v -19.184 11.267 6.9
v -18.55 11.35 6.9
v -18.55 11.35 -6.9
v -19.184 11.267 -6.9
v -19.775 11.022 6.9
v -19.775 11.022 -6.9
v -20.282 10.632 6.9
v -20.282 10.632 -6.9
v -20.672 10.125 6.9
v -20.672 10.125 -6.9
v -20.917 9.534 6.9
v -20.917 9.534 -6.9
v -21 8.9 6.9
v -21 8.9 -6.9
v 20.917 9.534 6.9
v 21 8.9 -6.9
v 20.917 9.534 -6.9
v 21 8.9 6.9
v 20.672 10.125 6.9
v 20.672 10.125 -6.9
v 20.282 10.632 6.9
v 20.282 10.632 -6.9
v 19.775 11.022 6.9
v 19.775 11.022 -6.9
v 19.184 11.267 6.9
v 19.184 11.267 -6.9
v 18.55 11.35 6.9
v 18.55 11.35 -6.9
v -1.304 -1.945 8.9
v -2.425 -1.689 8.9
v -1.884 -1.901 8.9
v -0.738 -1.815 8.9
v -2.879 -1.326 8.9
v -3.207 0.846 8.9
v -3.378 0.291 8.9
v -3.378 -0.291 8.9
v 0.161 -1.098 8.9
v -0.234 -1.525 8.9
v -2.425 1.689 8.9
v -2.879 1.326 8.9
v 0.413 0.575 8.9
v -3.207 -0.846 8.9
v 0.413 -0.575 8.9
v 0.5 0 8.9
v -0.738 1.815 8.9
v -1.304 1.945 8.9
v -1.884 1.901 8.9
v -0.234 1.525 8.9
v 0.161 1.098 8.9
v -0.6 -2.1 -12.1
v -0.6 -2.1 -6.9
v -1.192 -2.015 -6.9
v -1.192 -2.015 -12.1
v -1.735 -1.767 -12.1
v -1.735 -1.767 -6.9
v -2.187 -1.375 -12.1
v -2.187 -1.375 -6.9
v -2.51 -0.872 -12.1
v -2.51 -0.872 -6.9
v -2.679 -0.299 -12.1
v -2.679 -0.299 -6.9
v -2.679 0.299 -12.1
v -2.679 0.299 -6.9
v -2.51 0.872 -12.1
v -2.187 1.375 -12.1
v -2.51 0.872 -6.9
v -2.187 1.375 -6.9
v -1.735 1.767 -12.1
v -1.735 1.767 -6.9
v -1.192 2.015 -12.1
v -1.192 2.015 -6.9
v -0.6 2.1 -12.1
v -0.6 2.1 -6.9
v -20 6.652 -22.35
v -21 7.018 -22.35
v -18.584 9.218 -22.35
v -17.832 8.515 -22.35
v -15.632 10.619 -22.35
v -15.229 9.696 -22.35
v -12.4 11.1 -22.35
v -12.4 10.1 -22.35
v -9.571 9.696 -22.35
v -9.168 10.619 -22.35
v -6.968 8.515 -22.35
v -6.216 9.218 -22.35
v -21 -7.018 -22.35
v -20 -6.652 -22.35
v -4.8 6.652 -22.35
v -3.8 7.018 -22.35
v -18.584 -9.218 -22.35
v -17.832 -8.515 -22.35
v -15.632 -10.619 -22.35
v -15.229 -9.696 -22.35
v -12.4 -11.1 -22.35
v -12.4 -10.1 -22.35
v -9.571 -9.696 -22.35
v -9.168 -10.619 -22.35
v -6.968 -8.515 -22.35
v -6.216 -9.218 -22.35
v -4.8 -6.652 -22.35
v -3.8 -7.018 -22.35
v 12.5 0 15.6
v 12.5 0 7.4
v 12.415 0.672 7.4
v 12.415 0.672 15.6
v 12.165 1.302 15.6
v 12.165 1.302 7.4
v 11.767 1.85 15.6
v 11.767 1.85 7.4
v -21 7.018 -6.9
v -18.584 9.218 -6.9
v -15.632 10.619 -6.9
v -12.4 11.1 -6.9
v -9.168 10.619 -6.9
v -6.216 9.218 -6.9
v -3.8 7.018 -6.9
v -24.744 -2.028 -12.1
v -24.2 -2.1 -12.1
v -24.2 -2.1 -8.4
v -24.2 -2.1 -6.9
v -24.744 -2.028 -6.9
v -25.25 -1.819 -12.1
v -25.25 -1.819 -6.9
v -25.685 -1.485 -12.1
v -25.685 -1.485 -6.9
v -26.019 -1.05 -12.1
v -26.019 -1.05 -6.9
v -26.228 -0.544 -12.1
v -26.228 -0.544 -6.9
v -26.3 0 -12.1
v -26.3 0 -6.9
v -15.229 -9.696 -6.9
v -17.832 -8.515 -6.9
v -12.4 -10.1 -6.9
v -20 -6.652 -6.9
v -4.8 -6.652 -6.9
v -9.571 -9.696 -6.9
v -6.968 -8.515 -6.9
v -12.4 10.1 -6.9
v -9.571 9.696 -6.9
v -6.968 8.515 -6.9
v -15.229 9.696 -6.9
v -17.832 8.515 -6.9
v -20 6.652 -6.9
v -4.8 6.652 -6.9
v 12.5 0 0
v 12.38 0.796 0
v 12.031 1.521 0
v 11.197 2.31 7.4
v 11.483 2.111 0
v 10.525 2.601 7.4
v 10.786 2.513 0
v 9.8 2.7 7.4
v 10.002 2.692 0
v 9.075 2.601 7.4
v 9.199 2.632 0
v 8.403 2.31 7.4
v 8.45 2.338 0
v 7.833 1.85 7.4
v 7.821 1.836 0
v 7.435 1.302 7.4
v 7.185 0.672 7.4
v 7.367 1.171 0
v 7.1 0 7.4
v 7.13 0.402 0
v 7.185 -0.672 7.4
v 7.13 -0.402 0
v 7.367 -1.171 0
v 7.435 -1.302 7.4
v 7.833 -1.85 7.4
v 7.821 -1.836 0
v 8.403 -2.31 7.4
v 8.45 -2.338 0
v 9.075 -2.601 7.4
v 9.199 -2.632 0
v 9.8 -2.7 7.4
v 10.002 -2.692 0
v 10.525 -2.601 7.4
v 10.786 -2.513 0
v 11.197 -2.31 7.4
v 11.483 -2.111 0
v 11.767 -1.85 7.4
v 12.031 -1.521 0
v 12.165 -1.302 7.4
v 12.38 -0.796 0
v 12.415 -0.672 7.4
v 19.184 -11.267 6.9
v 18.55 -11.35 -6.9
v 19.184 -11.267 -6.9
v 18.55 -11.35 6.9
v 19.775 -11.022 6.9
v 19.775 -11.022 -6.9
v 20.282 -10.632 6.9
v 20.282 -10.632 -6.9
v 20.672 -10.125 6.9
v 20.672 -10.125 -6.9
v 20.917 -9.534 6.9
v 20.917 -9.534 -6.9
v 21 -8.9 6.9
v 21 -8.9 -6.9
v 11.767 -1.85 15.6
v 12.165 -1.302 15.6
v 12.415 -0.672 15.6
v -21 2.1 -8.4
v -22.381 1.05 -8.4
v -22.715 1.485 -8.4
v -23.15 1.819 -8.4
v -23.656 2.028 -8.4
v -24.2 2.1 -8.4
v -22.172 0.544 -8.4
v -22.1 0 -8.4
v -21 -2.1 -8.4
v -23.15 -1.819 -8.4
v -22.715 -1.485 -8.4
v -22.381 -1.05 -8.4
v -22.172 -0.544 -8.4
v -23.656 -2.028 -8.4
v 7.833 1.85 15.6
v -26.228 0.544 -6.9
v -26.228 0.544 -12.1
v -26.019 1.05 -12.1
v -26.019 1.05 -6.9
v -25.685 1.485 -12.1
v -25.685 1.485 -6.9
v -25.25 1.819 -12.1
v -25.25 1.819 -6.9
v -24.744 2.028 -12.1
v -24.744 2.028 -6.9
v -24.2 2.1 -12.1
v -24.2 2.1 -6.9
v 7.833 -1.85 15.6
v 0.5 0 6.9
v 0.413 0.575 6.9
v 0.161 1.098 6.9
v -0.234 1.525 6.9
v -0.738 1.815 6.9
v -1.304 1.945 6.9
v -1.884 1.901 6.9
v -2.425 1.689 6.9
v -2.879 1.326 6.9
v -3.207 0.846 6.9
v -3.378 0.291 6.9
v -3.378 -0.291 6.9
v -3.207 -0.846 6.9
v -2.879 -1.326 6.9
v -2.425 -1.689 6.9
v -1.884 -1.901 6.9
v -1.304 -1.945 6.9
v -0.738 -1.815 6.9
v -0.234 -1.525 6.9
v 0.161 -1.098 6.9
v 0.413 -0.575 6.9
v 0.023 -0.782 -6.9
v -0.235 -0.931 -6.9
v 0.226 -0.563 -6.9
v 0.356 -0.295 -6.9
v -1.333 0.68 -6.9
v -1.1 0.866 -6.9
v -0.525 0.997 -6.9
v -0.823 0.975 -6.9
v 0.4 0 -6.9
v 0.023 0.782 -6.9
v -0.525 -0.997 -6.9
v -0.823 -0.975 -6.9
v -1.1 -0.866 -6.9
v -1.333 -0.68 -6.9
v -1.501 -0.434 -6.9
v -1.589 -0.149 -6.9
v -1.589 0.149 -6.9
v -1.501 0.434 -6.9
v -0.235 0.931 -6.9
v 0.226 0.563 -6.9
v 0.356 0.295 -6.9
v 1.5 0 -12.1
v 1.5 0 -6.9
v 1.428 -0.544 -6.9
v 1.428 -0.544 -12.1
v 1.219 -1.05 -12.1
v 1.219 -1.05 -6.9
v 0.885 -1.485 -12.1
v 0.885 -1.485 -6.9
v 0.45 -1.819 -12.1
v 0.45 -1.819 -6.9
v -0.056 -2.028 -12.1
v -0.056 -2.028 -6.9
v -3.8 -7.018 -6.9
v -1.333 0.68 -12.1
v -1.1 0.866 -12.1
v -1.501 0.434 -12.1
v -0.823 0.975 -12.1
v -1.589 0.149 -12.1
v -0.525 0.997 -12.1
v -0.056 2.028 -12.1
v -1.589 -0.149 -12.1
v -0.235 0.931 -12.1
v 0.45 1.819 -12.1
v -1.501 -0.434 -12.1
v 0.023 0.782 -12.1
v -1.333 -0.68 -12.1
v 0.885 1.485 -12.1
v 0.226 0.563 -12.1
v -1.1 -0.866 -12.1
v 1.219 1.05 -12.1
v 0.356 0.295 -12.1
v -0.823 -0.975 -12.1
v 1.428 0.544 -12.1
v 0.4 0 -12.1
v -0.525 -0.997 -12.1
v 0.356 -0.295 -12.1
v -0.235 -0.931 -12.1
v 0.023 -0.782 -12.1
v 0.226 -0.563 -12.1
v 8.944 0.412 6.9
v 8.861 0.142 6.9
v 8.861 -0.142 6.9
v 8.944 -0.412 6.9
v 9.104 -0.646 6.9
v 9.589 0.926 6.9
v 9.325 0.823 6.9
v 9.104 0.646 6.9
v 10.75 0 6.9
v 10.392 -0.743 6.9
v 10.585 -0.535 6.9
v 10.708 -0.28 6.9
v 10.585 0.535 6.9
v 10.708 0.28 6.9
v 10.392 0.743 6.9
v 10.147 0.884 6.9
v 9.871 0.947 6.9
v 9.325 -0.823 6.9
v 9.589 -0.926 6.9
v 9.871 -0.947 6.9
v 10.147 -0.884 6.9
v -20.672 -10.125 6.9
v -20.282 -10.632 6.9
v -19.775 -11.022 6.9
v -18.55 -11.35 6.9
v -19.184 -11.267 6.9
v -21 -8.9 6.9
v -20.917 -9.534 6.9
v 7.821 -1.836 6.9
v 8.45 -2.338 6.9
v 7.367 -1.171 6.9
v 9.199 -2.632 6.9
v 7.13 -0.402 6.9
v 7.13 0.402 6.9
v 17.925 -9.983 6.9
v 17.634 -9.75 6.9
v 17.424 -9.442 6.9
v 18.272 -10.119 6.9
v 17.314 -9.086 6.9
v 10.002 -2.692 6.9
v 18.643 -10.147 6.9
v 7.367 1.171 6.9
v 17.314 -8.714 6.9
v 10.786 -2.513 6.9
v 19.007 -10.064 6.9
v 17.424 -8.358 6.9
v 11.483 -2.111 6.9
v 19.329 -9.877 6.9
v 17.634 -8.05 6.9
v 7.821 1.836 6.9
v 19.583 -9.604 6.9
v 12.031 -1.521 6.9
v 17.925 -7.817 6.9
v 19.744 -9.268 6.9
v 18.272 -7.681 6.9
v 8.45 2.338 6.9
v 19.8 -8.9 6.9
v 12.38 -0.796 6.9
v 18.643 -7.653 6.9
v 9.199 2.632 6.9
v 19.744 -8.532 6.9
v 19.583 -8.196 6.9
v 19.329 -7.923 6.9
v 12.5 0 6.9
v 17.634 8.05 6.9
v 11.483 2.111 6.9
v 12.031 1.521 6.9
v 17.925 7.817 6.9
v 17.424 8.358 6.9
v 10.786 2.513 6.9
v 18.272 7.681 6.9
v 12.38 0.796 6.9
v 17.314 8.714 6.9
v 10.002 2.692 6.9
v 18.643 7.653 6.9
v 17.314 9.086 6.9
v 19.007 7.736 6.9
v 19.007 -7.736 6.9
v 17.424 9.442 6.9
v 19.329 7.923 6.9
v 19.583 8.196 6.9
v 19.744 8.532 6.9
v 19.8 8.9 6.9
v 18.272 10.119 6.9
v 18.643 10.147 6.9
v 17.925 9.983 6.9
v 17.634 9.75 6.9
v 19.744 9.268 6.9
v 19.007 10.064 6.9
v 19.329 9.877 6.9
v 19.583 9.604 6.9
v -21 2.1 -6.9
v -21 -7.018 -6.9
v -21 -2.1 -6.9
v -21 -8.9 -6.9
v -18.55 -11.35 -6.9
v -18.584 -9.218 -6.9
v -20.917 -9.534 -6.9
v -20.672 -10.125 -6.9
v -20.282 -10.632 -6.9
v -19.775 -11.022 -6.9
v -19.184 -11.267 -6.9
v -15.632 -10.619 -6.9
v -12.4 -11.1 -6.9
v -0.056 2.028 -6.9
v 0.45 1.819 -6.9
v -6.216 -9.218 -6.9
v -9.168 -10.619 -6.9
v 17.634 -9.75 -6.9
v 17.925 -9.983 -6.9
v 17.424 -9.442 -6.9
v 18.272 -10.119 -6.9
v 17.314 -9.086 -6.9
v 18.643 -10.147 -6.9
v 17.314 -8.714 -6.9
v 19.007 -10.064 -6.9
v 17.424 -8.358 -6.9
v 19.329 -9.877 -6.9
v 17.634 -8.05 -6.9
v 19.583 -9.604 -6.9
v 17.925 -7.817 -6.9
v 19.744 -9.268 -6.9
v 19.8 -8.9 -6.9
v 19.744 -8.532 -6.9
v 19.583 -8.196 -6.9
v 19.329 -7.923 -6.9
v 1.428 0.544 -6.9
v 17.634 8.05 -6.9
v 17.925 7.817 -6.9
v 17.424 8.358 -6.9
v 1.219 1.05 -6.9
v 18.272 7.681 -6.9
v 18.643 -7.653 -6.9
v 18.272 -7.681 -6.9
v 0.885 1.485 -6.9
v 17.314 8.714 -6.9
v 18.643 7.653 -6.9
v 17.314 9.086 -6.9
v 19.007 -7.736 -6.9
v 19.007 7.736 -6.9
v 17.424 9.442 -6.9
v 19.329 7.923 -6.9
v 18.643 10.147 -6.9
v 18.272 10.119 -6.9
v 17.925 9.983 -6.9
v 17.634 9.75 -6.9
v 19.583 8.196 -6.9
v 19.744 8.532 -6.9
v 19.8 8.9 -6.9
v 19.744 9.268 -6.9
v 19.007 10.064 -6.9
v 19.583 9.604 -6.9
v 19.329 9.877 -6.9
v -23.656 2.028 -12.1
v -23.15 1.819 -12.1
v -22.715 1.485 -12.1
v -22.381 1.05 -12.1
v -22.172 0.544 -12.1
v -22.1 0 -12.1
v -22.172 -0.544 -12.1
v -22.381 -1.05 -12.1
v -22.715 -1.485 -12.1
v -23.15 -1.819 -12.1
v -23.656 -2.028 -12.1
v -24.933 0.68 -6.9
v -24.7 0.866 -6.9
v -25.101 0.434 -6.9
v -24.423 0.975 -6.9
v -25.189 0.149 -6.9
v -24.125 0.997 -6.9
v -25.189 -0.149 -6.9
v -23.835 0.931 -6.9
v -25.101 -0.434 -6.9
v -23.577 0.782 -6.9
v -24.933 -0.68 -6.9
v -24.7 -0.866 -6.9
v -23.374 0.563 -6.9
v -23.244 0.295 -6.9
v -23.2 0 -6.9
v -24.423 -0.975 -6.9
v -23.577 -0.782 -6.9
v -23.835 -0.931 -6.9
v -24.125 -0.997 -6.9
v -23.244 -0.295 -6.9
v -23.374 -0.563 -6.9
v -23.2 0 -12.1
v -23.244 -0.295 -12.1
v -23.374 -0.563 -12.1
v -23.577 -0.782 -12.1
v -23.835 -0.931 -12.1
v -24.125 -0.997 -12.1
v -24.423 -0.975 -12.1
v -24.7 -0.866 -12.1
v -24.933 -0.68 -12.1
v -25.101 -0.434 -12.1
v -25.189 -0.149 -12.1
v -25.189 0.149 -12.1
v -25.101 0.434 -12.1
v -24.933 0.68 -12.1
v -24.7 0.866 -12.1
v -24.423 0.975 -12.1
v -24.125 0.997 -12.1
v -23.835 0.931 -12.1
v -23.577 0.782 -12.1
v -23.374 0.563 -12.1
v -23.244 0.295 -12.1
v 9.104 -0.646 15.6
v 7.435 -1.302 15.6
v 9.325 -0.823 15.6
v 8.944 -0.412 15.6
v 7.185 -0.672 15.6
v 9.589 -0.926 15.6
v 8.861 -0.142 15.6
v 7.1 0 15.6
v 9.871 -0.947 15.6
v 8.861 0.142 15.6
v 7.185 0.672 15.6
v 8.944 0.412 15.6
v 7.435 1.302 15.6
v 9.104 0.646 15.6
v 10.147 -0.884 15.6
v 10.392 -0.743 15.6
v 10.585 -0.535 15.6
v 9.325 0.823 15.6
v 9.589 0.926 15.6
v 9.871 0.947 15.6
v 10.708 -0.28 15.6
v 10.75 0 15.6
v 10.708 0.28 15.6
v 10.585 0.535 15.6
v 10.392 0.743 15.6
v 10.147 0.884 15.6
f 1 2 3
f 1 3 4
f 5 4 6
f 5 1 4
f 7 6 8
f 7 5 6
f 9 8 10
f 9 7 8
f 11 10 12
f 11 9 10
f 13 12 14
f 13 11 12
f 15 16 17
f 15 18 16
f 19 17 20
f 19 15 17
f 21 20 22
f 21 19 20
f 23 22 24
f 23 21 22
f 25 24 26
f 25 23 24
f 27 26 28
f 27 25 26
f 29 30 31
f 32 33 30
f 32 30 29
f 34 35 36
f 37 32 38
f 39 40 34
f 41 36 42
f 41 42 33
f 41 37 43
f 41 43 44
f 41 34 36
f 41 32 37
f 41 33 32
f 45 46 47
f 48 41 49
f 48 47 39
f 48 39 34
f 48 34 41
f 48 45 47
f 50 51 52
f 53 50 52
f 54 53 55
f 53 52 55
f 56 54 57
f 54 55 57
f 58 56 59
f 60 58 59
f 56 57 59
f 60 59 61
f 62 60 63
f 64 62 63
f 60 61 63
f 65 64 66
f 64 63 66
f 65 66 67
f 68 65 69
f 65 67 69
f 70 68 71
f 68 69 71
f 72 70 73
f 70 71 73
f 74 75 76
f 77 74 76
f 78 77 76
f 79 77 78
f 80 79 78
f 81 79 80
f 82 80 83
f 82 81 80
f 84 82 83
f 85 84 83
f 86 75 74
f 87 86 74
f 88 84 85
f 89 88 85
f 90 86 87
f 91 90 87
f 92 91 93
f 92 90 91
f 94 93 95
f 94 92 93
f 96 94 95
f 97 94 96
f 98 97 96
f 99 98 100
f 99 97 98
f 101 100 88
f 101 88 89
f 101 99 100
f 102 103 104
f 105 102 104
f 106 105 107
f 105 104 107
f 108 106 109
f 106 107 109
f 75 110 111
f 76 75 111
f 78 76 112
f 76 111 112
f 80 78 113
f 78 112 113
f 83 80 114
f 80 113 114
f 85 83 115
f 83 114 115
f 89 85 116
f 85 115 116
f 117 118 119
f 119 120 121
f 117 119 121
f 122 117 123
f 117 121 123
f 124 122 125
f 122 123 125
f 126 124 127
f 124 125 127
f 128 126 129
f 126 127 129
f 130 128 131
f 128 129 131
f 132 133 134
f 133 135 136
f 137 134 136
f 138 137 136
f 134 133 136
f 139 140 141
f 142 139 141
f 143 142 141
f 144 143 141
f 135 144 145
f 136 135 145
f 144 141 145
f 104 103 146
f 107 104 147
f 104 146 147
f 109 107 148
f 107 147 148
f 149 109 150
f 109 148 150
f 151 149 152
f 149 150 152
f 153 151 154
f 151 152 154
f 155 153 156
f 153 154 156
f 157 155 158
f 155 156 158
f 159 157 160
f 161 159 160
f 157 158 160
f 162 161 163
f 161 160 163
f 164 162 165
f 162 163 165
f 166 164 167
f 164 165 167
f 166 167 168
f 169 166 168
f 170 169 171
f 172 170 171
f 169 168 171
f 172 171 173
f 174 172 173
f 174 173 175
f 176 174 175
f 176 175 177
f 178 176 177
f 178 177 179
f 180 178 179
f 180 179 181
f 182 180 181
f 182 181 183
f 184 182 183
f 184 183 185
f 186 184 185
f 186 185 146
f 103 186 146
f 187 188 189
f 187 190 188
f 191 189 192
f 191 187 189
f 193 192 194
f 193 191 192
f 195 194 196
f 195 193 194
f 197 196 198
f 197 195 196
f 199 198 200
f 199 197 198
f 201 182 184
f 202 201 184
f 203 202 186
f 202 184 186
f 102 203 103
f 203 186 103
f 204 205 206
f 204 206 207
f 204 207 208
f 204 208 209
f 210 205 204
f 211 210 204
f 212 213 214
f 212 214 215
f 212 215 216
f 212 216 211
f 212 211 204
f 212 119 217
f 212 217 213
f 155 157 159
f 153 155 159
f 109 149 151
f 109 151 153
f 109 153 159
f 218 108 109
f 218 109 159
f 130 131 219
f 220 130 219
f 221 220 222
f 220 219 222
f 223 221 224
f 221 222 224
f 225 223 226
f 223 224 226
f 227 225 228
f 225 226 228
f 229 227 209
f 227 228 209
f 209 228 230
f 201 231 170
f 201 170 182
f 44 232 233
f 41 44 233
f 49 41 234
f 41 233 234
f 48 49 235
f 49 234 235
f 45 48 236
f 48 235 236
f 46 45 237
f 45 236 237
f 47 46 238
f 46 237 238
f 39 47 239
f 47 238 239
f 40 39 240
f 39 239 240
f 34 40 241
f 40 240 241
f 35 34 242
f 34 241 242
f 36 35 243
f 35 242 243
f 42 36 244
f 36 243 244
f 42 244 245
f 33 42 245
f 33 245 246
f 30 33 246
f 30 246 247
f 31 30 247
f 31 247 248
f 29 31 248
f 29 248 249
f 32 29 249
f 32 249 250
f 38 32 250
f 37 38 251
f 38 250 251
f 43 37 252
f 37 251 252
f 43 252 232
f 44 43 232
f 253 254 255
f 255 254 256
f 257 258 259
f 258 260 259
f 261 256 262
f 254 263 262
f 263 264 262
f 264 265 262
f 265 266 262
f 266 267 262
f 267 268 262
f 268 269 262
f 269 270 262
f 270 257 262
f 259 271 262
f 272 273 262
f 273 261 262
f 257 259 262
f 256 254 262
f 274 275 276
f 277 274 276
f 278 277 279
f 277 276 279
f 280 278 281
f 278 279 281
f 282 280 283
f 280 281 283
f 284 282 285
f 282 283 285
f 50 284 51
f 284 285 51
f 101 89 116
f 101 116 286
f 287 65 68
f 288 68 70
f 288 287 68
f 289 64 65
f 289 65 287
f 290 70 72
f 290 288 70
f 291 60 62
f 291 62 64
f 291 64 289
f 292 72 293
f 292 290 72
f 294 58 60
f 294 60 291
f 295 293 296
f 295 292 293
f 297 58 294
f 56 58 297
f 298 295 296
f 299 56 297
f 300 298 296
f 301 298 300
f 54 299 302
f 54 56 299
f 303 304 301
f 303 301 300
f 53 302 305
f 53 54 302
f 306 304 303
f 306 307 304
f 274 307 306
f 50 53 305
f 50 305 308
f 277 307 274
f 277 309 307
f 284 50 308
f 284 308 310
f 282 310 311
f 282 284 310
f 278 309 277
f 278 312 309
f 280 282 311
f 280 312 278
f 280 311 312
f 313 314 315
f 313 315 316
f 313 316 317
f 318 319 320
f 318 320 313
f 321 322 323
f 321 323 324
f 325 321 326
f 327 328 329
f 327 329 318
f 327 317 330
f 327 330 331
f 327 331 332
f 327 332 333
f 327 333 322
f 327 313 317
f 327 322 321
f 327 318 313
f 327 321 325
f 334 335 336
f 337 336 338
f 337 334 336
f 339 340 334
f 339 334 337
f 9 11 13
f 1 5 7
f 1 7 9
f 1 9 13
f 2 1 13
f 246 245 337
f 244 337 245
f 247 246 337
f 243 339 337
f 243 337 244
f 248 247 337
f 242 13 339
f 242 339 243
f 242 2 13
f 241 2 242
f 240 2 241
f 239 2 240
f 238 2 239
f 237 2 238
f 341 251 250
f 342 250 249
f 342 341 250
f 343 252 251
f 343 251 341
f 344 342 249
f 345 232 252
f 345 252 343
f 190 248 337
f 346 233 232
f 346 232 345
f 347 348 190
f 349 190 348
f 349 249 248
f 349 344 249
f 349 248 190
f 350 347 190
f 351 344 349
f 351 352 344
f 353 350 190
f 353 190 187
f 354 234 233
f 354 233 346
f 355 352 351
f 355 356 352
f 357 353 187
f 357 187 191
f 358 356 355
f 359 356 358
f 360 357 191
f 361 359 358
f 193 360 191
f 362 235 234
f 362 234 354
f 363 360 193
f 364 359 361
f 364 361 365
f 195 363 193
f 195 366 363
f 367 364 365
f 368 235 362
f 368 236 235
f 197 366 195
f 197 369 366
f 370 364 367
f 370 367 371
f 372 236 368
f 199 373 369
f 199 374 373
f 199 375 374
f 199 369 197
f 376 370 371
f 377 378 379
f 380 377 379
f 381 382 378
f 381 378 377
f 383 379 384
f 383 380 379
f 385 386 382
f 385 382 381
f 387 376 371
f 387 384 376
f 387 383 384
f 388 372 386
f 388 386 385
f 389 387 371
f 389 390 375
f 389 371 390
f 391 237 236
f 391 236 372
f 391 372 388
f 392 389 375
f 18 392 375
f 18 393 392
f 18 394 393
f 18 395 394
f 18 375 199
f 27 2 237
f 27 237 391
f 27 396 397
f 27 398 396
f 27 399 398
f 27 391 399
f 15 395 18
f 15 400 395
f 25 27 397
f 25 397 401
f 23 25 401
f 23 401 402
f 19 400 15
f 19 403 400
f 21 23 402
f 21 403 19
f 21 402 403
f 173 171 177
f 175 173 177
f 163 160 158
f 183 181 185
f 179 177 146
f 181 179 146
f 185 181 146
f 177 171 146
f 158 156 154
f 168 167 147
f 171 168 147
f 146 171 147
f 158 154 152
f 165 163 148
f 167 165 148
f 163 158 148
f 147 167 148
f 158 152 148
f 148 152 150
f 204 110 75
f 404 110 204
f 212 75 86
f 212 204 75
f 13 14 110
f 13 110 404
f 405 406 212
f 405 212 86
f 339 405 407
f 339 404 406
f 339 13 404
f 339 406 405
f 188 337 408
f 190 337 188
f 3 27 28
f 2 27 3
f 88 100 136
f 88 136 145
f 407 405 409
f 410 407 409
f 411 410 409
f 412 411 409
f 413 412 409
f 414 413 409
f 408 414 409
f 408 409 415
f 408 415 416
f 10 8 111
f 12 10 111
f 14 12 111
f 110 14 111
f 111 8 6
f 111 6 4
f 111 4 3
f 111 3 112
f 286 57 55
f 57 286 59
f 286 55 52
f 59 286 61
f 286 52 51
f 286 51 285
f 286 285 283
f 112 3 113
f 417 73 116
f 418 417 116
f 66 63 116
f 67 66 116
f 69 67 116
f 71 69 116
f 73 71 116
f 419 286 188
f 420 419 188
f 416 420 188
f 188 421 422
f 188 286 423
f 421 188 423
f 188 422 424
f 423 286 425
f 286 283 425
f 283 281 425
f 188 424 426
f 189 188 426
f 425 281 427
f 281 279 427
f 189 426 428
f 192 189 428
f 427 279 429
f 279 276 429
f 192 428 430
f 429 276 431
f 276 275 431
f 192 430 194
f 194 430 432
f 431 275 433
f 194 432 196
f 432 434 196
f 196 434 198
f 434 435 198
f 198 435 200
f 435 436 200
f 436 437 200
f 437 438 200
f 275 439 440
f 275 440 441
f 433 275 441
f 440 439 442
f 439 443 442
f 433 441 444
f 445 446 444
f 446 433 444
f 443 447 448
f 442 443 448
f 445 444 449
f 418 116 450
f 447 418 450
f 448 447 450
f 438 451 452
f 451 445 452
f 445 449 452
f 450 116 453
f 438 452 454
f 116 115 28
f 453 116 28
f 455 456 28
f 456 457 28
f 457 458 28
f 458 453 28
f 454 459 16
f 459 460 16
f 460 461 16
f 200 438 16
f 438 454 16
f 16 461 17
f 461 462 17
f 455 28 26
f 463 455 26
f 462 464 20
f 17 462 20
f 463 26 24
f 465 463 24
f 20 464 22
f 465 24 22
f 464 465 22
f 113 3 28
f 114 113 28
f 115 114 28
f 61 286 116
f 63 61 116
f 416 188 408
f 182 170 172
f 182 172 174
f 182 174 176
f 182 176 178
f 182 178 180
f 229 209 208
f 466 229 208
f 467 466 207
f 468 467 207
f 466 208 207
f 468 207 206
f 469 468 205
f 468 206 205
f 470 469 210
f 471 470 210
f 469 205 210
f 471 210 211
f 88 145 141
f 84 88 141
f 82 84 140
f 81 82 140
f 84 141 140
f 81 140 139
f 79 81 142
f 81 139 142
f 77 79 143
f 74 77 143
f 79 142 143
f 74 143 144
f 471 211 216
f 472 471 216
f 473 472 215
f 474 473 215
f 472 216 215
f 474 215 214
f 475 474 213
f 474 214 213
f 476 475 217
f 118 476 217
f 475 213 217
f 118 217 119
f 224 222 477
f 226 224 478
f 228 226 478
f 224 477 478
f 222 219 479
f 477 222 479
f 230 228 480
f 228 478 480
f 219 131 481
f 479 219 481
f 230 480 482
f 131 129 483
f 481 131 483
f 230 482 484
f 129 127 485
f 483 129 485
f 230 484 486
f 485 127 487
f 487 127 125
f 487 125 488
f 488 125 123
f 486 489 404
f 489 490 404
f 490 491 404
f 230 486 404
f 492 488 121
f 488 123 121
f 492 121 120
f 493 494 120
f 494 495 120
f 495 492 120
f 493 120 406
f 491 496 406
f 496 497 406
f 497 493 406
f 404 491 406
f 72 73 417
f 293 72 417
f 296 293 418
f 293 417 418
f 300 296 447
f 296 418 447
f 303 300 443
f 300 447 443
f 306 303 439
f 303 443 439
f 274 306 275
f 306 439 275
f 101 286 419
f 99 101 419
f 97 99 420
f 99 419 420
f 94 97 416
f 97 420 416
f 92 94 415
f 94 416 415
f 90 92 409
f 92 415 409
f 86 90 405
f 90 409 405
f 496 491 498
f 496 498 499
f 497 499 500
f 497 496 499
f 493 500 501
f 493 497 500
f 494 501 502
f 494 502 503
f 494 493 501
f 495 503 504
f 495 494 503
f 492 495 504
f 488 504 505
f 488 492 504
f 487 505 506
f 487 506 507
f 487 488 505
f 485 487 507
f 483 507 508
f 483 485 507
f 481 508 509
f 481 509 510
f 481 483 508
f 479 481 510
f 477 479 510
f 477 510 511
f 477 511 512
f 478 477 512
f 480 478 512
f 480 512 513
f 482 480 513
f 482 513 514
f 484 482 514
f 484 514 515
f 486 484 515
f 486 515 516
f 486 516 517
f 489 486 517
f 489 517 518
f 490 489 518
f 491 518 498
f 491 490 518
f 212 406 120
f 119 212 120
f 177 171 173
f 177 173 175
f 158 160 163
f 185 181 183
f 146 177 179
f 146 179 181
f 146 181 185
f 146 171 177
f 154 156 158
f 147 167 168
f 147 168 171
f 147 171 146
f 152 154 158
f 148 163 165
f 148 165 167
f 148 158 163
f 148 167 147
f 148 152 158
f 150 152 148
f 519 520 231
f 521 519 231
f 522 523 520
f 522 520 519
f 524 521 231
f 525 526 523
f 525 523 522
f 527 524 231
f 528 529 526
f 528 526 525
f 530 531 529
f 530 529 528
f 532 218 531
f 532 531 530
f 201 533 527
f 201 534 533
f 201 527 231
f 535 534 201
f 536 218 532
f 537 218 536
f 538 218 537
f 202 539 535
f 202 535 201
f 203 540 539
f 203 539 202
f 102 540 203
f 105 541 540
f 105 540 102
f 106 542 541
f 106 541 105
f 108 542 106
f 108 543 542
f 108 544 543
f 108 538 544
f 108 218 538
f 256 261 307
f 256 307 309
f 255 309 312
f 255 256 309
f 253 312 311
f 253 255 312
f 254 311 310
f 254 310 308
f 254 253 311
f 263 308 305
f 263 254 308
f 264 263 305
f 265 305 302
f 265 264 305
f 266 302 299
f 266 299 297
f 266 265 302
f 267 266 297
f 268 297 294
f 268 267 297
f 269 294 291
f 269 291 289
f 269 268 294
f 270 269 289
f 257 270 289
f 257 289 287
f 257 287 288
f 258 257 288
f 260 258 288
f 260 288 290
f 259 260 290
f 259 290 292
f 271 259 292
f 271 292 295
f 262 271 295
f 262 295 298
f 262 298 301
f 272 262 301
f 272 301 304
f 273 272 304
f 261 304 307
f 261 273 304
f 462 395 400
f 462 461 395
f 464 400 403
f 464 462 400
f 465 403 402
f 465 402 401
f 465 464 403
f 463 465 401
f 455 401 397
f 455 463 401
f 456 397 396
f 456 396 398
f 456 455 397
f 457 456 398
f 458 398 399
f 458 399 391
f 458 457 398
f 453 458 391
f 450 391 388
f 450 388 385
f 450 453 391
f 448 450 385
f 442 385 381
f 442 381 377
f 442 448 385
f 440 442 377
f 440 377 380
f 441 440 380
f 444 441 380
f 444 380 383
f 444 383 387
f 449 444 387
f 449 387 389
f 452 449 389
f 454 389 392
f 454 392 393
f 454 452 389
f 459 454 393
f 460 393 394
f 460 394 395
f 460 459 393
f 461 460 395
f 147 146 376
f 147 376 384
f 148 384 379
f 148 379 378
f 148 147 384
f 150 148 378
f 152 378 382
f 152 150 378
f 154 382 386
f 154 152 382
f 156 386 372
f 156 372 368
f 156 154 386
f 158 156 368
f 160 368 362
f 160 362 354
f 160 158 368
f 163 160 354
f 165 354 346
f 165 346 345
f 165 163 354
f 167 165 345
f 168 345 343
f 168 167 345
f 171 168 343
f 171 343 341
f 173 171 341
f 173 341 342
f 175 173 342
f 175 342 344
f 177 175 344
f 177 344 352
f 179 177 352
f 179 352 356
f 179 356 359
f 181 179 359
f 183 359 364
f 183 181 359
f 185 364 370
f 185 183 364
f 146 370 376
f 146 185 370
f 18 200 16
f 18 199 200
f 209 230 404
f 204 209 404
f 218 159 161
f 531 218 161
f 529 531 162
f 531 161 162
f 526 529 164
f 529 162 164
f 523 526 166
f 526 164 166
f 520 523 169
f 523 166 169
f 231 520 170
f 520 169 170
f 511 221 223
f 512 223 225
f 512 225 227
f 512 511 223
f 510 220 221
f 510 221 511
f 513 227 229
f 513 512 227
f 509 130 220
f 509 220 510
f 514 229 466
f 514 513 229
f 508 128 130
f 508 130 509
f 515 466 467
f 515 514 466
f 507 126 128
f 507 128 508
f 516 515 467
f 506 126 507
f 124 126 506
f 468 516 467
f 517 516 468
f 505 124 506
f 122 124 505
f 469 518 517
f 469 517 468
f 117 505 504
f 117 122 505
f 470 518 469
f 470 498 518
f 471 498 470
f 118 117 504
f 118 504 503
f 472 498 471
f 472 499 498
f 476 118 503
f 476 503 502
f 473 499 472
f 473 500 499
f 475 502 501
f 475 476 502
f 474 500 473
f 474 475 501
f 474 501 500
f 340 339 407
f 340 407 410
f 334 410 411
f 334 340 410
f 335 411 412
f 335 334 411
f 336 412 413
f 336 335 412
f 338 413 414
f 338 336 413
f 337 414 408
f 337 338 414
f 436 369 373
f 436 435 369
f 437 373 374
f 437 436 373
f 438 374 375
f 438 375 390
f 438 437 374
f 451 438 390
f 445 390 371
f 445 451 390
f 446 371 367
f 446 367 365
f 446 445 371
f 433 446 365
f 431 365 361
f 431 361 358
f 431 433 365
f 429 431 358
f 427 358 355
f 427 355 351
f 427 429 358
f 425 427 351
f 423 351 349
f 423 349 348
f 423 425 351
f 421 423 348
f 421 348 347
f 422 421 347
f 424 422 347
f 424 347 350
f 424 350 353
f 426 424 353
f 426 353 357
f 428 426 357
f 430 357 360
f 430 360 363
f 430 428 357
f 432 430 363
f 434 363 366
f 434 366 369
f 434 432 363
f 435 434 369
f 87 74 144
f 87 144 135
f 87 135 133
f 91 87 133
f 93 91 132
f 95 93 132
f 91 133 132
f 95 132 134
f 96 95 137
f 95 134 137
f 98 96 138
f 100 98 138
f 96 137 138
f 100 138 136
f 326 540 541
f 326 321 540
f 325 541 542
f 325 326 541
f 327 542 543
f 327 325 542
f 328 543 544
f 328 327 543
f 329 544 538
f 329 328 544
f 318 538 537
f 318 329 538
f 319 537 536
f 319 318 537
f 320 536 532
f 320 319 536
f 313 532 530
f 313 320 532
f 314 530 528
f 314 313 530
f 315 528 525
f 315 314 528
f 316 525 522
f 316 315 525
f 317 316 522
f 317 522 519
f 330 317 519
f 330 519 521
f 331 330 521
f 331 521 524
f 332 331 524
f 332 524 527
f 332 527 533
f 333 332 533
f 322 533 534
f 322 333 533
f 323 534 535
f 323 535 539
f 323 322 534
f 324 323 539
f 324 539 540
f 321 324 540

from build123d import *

# Parameters (mm, degrees)
F0_R      = 1.25
F0_R_2    = 2.7
F1_DEPTH  = 6.9
F0_R_3    = 0.95
F2_DEPTH  = 6.9
F3_DEPTH  = 7.4
F4_R      = 0.95
F5_DEPTH  = 8.2
F6_DEPTH  = 6.9
F9_DEPTH  = 15.45
F10_DEPTH = 1.5
F8_R      = 1
F11_DEPTH = 5.2
F12_R     = 1.95
F13_DEPTH = 2


with BuildPart() as f1:
    # F0 (on Top) → F1 (new body, symmetric)
    with BuildSketch(Plane.XY):
        with BuildLine():
            ThreePointArc((21, 8.9), (20.2824116139, 10.6324116139), (18.55, 11.35))
            Line((18.55, 11.35), (-18.55, 11.35))
            ThreePointArc((-18.55, 11.35), (-20.2824116139, 10.6324116139), (-21, 8.9))
            Line((-21, 8.9), (-21, -8.9))
            ThreePointArc((-21, -8.9), (-20.2824116139, -10.6324116139), (-18.55, -11.35))
            Line((-18.55, -11.35), (18.55, -11.35))
            ThreePointArc((18.55, -11.35), (20.2824116139, -10.6324116139), (21, -8.9))
            Line((21, -8.9), (21, 8.9))
        make_face()
        with Locations((18.55, -8.9)):
            Circle(F0_R, mode=Mode.SUBTRACT)
        with Locations((9.8, 0)):
            Circle(F0_R_2, mode=Mode.SUBTRACT)
        with Locations((18.55, 8.9)):
            Circle(F0_R, mode=Mode.SUBTRACT)
    extrude(amount=F1_DEPTH, both=True)

    # F0 (on Top) → F6 (join, through all)
    with BuildSketch(Plane.XY):
        with Locations((9.8, 0)):
            Circle(F0_R_2)
        with Locations((9.8, 0)):
            Circle(F0_R_3, mode=Mode.SUBTRACT)
        with Locations((9.8, 0)):
            Circle(F0_R_3)
    extrude(amount=-F6_DEPTH)

    # F7: union 

    # F8 (on face) → F9 (join)
    with BuildSketch(Plane(origin=(0, 0, -6.9), x_dir=(1, 0, 0), z_dir=(0, 0, -1))):
        with BuildLine():
            ThreePointArc((-3.8, 7.0178344238), (-12.4, 11.1), (-21, 7.0178344238))
            Line((-21, 7.0178344238), (-21, 2.1))
            Line((-21, 2.1), (-21, -2.1))
            Line((-21, -2.1), (-21, -7.0178344238))
            ThreePointArc((-21, -7.0178344238), (-12.4, -11.1), (-3.8, -7.0178344238))
            Line((-3.8, -7.0178344238), (-3.8, -2.1))
            Line((-3.8, -2.1), (-3.8, 2.1))
            Line((-3.8, 2.1), (-3.8, 7.0178344238))
        make_face()
        with BuildLine():
            ThreePointArc((-20, 6.6520673478), (-12.4, 10.1), (-4.8, 6.6520673478))
            Line((-4.8, 6.6520673478), (-4.8, -6.6520673478))
            ThreePointArc((-4.8, -6.6520673478), (-12.4, -10.1), (-20, -6.6520673478))
            Line((-20, -6.6520673478), (-20, 6.6520673478))
        make_face(mode=Mode.SUBTRACT)
    extrude(amount=F9_DEPTH)

    # F8 (on face) → F10 (join)
    with BuildSketch(Plane(origin=(0, 0, -6.9), x_dir=(1, 0, 0), z_dir=(0, 0, -1))):
        with BuildLine():
            Line((-21, -2.1), (-21, 2.1))
            Line((-21, 2.1), (-24.2, 2.1))
            ThreePointArc((-24.2, 2.1), (-22.7150757595, 1.4849242405), (-22.1, 0))
            ThreePointArc((-22.1, 0), (-22.7150757595, -1.4849242405), (-24.2, -2.1))
            Line((-24.2, -2.1), (-21, -2.1))
        make_face()
    extrude(amount=F10_DEPTH)

    # F8 (on face) → F11 (join)
    with BuildSketch(Plane(origin=(0, 0, -6.9), x_dir=(1, 0, 0), z_dir=(0, 0, -1))):
        with BuildLine():
            ThreePointArc((-22.1, 0), (-22.7150757595, 1.4849242405), (-24.2, 2.1))
            ThreePointArc((-24.2, 2.1), (-25.6849242405, 1.4849242405), (-26.3, 0))
            ThreePointArc((-26.3, 0), (-25.6849242405, -1.4849242405), (-24.2, -2.1))
            ThreePointArc((-24.2, -2.1), (-22.7150757595, -1.4849242405), (-22.1, 0))
        make_face()
        with Locations((-24.2, 0)):
            Circle(F8_R, mode=Mode.SUBTRACT)
        with BuildLine():
            ThreePointArc((1.5, 0), (0.8849242405, 1.4849242405), (-0.6, 2.1))
            ThreePointArc((-0.6, 2.1), (-2.7, 0), (-0.6, -2.1))
            ThreePointArc((-0.6, -2.1), (0.8849242405, -1.4849242405), (1.5, 0))
        make_face()
        with Locations((-0.6, 0)):
            Circle(F8_R, mode=Mode.SUBTRACT)
    extrude(amount=F11_DEPTH)

    # F12 (on face) → F13 (join)
    with BuildSketch(Plane.XY.offset(6.9)):
        with Locations((-1.45, 0)):
            Circle(F12_R)
    extrude(amount=F13_DEPTH)


with BuildPart() as f2:
    # F0 (on Top) → F2 (new body)
    with BuildSketch(Plane.XY):
        with Locations((9.8, 0)):
            Circle(F0_R_3)
    extrude(amount=F2_DEPTH)

    # F0 (on Top) → F3 (join)
    with BuildSketch(Plane.XY):
        with Locations((9.8, 0)):
            Circle(F0_R_2)
        with Locations((9.8, 0)):
            Circle(F0_R_3, mode=Mode.SUBTRACT)
    extrude(amount=F3_DEPTH)

    # F4 (on face) → F5 (join)
    with BuildSketch(Plane.XY.offset(7.4)):
        with BuildLine():
            ThreePointArc((11.7665960439, -1.85), (12.3099610872, -0.9950353465), (12.5, 0))
            ThreePointArc((12.5, 0), (12.3099610872, 0.9950353465), (11.7665960439, 1.85))
            Line((11.7665960439, 1.85), (7.8334039561, 1.85))
            ThreePointArc((7.8334039561, 1.85), (7.1, 0), (7.8334039561, -1.85))
            Line((7.8334039561, -1.85), (11.7665960439, -1.85))
        make_face()
        with Locations((9.8, 0)):
            Circle(F4_R, mode=Mode.SUBTRACT)
    extrude(amount=F5_DEPTH)


solid = Compound([f1.part, f2.part])
